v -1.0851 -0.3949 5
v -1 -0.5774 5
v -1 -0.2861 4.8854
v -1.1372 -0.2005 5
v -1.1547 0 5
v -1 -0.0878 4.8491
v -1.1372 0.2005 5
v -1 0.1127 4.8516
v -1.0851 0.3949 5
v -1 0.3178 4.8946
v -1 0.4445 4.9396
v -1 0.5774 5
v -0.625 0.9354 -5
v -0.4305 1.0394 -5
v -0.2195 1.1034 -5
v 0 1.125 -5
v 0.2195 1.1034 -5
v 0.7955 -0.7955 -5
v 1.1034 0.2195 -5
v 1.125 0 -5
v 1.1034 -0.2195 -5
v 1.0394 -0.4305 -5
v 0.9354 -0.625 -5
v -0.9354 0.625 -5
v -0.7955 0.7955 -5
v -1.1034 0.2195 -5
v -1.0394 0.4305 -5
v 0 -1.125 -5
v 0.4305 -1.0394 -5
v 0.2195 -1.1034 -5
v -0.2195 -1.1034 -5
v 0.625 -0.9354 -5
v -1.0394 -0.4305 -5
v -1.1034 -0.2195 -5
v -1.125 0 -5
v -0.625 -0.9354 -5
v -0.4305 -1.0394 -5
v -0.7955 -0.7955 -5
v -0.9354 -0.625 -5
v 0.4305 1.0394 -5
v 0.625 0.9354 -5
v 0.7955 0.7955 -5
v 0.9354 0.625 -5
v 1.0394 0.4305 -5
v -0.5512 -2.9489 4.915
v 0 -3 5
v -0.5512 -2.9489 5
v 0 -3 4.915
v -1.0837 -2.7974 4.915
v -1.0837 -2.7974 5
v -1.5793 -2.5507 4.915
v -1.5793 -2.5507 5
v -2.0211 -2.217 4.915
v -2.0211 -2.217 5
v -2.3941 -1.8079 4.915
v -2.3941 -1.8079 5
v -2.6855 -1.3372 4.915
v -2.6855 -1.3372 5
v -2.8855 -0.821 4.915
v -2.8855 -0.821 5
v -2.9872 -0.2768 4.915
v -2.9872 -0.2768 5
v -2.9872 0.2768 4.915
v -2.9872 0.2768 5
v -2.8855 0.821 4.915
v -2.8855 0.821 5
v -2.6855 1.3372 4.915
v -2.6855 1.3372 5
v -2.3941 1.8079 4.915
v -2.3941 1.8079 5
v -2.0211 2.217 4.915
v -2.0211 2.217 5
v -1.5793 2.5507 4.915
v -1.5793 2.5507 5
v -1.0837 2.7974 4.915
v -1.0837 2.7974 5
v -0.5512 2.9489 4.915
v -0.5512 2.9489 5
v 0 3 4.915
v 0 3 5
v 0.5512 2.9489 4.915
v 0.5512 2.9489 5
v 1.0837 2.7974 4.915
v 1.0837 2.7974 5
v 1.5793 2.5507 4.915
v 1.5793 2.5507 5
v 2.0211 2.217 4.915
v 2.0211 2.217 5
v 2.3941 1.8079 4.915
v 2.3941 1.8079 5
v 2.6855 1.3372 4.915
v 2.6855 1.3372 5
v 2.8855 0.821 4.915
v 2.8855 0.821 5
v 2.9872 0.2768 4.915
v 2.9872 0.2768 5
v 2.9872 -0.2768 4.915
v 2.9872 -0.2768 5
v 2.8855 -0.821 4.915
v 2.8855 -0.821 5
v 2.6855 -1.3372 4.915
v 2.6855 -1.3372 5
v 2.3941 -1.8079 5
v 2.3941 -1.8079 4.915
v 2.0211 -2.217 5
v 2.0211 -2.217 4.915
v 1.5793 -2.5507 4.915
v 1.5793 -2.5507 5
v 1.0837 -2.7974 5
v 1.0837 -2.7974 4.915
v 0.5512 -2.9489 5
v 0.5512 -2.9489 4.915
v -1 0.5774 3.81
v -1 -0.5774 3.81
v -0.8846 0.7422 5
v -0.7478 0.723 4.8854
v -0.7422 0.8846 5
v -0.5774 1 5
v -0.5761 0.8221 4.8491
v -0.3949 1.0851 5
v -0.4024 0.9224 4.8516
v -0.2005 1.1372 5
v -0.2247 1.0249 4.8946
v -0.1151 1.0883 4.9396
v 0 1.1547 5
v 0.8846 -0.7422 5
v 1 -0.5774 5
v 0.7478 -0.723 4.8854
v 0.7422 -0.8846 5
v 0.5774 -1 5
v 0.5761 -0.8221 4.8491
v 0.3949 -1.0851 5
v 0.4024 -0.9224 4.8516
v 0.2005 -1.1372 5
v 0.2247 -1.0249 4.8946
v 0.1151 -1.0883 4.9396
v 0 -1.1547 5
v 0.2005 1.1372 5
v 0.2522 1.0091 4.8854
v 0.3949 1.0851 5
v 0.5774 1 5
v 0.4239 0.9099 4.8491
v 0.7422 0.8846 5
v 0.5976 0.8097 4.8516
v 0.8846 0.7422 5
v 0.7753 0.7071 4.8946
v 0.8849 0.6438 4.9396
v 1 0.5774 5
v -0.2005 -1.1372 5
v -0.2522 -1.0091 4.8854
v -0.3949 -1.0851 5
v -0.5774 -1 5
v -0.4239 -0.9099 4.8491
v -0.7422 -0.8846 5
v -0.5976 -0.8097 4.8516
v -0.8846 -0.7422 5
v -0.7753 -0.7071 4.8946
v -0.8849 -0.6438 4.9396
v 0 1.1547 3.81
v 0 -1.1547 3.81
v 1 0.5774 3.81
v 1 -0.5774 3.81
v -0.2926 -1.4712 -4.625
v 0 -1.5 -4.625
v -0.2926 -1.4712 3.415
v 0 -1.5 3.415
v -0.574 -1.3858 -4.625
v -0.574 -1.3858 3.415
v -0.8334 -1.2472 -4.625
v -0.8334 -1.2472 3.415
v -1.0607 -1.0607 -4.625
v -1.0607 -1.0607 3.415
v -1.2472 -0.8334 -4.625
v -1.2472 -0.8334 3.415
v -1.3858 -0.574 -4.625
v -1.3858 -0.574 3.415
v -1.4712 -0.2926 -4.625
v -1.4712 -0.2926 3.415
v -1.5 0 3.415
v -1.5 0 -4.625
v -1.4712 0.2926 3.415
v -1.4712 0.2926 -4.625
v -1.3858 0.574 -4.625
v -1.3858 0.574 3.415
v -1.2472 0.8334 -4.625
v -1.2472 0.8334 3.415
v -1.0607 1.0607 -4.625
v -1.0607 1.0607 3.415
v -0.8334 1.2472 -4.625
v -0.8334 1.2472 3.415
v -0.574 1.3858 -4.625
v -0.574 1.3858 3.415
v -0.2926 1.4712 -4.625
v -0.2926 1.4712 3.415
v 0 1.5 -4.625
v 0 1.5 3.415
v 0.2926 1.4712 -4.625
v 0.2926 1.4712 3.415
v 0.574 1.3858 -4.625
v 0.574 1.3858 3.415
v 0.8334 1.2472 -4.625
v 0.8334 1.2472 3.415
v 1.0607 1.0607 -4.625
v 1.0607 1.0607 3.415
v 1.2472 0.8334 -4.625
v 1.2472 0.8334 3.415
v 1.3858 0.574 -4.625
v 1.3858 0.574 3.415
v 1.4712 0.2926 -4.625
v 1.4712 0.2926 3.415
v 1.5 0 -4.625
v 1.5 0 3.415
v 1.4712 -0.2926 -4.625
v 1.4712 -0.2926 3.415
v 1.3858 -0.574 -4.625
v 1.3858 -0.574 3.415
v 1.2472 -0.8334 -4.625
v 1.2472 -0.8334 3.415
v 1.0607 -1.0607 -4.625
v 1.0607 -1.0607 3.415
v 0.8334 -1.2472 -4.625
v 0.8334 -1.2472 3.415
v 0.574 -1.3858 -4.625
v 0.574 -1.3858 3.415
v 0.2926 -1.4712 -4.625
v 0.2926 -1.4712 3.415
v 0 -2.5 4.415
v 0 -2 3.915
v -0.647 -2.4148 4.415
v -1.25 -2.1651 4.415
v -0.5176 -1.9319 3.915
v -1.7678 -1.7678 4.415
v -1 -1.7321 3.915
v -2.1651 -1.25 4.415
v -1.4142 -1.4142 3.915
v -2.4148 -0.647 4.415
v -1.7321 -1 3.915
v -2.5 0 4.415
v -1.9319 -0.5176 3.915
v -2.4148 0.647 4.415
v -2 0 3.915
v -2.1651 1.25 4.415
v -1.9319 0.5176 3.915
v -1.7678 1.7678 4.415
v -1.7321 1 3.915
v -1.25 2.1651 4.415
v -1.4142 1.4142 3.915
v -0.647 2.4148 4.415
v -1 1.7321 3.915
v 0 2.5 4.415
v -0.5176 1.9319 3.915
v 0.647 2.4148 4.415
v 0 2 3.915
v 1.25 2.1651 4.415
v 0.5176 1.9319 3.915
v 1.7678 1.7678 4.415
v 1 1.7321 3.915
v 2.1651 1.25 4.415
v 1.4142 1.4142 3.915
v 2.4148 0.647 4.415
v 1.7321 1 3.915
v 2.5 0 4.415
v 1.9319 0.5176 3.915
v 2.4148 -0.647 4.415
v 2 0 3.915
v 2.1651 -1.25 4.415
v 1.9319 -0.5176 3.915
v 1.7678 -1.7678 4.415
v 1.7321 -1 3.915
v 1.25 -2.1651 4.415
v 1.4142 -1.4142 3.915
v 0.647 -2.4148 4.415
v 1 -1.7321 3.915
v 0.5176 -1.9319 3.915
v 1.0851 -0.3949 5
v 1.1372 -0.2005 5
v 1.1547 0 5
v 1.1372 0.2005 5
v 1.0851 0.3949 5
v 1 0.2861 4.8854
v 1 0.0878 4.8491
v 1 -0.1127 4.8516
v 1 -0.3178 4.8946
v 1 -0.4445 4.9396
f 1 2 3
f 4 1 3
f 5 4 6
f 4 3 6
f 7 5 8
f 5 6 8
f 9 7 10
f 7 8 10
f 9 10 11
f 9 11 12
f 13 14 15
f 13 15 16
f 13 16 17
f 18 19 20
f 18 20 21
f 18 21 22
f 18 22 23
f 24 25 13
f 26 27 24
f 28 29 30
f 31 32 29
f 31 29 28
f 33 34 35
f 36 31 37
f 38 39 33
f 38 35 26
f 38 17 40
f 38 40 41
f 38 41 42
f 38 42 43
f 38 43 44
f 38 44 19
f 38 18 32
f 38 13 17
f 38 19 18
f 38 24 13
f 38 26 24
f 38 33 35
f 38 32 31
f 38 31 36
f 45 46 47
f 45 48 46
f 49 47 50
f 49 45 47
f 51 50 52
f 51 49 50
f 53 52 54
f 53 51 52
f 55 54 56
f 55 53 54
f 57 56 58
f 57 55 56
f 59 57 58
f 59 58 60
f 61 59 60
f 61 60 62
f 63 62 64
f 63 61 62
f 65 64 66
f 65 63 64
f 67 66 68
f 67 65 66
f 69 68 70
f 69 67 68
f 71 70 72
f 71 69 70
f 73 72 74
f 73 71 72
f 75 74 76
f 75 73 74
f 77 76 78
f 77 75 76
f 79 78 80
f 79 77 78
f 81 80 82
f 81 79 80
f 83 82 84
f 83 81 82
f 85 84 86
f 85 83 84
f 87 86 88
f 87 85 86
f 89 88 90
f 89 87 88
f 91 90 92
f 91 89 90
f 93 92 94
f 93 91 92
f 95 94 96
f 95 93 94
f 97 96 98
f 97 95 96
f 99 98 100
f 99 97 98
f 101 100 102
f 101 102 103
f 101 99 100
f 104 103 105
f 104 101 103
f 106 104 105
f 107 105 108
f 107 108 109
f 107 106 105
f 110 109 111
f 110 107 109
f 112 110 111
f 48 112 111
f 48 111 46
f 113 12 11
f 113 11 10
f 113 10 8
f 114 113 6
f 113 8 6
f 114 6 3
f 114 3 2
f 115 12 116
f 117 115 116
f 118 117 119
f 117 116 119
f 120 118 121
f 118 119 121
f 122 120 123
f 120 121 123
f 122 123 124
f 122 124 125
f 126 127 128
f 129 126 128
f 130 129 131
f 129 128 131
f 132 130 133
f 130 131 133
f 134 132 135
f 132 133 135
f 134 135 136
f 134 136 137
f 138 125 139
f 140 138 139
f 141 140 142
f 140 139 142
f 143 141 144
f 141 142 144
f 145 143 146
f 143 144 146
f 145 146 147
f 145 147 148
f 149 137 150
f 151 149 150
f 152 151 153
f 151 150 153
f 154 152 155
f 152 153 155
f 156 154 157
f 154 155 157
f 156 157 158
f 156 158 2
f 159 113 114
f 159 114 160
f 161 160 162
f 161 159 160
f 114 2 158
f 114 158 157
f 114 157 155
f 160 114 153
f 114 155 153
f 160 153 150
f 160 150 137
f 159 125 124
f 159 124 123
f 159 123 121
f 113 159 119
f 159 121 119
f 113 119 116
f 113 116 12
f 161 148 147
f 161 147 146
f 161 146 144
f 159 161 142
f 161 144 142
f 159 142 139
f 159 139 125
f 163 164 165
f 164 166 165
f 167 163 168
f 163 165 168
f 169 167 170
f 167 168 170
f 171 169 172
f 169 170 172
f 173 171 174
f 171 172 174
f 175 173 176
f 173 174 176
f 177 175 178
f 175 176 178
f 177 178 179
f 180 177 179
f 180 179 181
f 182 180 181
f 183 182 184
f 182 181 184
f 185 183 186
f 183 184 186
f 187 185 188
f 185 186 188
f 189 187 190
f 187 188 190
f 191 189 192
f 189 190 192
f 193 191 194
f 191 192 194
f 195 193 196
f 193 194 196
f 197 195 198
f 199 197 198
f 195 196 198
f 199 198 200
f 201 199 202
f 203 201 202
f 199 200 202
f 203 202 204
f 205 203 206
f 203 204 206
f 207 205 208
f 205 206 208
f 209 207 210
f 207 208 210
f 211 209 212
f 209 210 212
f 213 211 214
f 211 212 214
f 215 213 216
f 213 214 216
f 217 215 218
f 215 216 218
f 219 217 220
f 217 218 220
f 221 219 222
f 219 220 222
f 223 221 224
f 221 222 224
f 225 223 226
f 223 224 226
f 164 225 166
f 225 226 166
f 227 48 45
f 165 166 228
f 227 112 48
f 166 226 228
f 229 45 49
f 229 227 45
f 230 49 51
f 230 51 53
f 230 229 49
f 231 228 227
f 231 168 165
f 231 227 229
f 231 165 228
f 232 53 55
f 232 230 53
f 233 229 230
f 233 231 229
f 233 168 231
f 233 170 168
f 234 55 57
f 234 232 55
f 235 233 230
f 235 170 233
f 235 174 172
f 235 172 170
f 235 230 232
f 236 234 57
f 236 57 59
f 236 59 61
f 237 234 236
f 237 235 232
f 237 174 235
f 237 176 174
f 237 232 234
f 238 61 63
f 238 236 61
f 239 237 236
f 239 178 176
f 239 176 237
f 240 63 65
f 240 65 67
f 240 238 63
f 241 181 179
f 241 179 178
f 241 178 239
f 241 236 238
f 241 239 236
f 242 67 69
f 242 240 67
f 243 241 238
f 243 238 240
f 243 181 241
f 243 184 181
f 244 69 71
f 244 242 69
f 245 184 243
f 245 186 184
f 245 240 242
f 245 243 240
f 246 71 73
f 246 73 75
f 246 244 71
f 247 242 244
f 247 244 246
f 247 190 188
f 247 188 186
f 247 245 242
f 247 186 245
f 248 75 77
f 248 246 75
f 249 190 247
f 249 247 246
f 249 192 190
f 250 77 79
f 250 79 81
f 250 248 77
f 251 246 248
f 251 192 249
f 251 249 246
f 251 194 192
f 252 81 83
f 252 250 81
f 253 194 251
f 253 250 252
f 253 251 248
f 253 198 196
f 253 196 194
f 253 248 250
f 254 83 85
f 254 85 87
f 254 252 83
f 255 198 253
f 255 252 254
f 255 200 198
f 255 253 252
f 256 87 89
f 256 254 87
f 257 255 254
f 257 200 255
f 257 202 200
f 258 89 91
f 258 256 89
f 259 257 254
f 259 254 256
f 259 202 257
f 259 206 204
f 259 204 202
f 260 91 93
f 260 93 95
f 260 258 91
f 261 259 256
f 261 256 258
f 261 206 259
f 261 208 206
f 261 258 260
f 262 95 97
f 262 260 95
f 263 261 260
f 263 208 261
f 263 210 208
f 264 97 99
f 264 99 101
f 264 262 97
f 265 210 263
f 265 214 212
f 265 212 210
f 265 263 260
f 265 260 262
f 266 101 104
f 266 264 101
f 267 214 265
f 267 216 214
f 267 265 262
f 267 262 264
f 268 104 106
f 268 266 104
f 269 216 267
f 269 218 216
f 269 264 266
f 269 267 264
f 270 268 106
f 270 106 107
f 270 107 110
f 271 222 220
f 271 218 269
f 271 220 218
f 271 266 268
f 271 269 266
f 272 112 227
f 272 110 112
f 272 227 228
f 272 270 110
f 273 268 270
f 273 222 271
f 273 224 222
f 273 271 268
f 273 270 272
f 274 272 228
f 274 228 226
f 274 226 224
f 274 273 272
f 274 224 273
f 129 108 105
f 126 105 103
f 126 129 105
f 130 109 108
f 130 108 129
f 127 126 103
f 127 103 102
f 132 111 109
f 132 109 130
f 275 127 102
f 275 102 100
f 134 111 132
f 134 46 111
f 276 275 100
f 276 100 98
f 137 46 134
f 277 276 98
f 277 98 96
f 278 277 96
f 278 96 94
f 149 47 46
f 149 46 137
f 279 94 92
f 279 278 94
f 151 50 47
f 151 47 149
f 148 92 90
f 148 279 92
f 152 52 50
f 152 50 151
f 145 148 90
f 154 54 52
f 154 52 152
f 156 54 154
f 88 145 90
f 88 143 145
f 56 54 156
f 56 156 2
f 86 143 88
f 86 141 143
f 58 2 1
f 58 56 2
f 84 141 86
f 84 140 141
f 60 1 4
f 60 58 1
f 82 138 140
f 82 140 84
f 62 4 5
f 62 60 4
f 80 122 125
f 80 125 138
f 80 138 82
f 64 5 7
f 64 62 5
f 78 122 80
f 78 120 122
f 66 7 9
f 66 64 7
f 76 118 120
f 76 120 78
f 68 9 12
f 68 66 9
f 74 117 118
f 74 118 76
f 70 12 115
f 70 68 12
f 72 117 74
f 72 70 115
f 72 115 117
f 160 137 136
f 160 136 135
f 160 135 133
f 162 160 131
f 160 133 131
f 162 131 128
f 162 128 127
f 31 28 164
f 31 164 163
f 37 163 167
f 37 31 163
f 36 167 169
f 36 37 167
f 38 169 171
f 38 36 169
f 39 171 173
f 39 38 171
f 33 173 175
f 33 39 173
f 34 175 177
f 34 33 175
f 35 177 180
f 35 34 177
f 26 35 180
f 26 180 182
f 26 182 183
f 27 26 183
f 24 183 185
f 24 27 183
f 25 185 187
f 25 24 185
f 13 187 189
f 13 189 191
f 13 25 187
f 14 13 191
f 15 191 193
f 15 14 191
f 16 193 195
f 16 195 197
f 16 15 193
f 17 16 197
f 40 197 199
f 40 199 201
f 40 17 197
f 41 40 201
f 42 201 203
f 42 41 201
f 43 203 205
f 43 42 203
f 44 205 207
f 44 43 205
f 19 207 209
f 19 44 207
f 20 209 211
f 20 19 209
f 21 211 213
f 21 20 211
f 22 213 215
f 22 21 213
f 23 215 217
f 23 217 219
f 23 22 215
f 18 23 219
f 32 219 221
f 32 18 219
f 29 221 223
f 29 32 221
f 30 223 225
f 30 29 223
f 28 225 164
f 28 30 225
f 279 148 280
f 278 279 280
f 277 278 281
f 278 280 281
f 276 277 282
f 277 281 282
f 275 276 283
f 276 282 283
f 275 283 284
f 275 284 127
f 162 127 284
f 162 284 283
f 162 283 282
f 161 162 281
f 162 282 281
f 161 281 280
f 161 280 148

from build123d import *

# Parameters (mm, degrees)
CHAMFER1_SIZE      = 0.375
CUT_EXTRUDE2_DEPTH = 1.19


with BuildPart() as part:
    # Sketch1 → Revolve1 (revolve)
    with BuildSketch(Plane(origin=(0, 0, 0), x_dir=(0, 0, -1), z_dir=(1, 0, 0)), mode=Mode.PRIVATE) as revolve1_sk:
        Polygon((-3.3, 1.5), (5, 1.5), (5, 0), (-3.81, 0), (-3.81, 1.5), align=None)
    revolve(revolve1_sk.sketch.rotate(Axis((0, 0, 3.81), (0, 0, -1)), 180), axis=Axis((0, 0, 3.81), (0, 0, -1)))

    # Chamfer1
    chamfer1_edges = [part.edges().sort_by_distance(p)[0] for p in [
        (0, 1.5, -5),
    ]]
    chamfer(chamfer1_edges, length=CHAMFER1_SIZE)


with BuildPart() as body_2:
    # Sketch7 → Revolve2 (revolve)
    with BuildSketch(Plane(origin=(0, 0, 0), x_dir=(0, 0, -1), z_dir=(1, 0, 0)), mode=Mode.PRIVATE) as revolve2_sk:
        Polygon((-5, 3), (-4.915, 3), (-3.3, 1.385), (-3.3, 0), (-5, 0), align=None)
    revolve(revolve2_sk.sketch.rotate(Axis((0, 0, 5), (0, 0, -1)), 180), axis=Axis((0, 0, 5), (0, 0, -1)))

    # Sketch5 → Cut-Extrude2 (cut)
    with BuildSketch(Plane.XY.offset(5)):
        Polygon((1, -0.577350269), (1, 0.577350269), (0, 1.154700538), (-1, 0.577350269), (-1, -0.577350269), (0, -1.154700538), align=None)
    extrude(amount=-CUT_EXTRUDE2_DEPTH, mode=Mode.SUBTRACT)

    # Cut-Extrude3 cone 1 section (through the dimple's axis) → Cut-Extrude3 (revolve, cut)
    with BuildSketch(Plane(origin=(0, 0, 5), x_dir=(0, -1, 0), z_dir=(1, 0, 0))):
        Polygon((0, 0), (1.154700538, 0), (0, 1.154700538), align=None)
    revolve(axis=Axis((0, 0, 5), (0, 0, -1)), mode=Mode.SUBTRACT)

    # Combine1: union part
    add(part.part)


solid = body_2.part
